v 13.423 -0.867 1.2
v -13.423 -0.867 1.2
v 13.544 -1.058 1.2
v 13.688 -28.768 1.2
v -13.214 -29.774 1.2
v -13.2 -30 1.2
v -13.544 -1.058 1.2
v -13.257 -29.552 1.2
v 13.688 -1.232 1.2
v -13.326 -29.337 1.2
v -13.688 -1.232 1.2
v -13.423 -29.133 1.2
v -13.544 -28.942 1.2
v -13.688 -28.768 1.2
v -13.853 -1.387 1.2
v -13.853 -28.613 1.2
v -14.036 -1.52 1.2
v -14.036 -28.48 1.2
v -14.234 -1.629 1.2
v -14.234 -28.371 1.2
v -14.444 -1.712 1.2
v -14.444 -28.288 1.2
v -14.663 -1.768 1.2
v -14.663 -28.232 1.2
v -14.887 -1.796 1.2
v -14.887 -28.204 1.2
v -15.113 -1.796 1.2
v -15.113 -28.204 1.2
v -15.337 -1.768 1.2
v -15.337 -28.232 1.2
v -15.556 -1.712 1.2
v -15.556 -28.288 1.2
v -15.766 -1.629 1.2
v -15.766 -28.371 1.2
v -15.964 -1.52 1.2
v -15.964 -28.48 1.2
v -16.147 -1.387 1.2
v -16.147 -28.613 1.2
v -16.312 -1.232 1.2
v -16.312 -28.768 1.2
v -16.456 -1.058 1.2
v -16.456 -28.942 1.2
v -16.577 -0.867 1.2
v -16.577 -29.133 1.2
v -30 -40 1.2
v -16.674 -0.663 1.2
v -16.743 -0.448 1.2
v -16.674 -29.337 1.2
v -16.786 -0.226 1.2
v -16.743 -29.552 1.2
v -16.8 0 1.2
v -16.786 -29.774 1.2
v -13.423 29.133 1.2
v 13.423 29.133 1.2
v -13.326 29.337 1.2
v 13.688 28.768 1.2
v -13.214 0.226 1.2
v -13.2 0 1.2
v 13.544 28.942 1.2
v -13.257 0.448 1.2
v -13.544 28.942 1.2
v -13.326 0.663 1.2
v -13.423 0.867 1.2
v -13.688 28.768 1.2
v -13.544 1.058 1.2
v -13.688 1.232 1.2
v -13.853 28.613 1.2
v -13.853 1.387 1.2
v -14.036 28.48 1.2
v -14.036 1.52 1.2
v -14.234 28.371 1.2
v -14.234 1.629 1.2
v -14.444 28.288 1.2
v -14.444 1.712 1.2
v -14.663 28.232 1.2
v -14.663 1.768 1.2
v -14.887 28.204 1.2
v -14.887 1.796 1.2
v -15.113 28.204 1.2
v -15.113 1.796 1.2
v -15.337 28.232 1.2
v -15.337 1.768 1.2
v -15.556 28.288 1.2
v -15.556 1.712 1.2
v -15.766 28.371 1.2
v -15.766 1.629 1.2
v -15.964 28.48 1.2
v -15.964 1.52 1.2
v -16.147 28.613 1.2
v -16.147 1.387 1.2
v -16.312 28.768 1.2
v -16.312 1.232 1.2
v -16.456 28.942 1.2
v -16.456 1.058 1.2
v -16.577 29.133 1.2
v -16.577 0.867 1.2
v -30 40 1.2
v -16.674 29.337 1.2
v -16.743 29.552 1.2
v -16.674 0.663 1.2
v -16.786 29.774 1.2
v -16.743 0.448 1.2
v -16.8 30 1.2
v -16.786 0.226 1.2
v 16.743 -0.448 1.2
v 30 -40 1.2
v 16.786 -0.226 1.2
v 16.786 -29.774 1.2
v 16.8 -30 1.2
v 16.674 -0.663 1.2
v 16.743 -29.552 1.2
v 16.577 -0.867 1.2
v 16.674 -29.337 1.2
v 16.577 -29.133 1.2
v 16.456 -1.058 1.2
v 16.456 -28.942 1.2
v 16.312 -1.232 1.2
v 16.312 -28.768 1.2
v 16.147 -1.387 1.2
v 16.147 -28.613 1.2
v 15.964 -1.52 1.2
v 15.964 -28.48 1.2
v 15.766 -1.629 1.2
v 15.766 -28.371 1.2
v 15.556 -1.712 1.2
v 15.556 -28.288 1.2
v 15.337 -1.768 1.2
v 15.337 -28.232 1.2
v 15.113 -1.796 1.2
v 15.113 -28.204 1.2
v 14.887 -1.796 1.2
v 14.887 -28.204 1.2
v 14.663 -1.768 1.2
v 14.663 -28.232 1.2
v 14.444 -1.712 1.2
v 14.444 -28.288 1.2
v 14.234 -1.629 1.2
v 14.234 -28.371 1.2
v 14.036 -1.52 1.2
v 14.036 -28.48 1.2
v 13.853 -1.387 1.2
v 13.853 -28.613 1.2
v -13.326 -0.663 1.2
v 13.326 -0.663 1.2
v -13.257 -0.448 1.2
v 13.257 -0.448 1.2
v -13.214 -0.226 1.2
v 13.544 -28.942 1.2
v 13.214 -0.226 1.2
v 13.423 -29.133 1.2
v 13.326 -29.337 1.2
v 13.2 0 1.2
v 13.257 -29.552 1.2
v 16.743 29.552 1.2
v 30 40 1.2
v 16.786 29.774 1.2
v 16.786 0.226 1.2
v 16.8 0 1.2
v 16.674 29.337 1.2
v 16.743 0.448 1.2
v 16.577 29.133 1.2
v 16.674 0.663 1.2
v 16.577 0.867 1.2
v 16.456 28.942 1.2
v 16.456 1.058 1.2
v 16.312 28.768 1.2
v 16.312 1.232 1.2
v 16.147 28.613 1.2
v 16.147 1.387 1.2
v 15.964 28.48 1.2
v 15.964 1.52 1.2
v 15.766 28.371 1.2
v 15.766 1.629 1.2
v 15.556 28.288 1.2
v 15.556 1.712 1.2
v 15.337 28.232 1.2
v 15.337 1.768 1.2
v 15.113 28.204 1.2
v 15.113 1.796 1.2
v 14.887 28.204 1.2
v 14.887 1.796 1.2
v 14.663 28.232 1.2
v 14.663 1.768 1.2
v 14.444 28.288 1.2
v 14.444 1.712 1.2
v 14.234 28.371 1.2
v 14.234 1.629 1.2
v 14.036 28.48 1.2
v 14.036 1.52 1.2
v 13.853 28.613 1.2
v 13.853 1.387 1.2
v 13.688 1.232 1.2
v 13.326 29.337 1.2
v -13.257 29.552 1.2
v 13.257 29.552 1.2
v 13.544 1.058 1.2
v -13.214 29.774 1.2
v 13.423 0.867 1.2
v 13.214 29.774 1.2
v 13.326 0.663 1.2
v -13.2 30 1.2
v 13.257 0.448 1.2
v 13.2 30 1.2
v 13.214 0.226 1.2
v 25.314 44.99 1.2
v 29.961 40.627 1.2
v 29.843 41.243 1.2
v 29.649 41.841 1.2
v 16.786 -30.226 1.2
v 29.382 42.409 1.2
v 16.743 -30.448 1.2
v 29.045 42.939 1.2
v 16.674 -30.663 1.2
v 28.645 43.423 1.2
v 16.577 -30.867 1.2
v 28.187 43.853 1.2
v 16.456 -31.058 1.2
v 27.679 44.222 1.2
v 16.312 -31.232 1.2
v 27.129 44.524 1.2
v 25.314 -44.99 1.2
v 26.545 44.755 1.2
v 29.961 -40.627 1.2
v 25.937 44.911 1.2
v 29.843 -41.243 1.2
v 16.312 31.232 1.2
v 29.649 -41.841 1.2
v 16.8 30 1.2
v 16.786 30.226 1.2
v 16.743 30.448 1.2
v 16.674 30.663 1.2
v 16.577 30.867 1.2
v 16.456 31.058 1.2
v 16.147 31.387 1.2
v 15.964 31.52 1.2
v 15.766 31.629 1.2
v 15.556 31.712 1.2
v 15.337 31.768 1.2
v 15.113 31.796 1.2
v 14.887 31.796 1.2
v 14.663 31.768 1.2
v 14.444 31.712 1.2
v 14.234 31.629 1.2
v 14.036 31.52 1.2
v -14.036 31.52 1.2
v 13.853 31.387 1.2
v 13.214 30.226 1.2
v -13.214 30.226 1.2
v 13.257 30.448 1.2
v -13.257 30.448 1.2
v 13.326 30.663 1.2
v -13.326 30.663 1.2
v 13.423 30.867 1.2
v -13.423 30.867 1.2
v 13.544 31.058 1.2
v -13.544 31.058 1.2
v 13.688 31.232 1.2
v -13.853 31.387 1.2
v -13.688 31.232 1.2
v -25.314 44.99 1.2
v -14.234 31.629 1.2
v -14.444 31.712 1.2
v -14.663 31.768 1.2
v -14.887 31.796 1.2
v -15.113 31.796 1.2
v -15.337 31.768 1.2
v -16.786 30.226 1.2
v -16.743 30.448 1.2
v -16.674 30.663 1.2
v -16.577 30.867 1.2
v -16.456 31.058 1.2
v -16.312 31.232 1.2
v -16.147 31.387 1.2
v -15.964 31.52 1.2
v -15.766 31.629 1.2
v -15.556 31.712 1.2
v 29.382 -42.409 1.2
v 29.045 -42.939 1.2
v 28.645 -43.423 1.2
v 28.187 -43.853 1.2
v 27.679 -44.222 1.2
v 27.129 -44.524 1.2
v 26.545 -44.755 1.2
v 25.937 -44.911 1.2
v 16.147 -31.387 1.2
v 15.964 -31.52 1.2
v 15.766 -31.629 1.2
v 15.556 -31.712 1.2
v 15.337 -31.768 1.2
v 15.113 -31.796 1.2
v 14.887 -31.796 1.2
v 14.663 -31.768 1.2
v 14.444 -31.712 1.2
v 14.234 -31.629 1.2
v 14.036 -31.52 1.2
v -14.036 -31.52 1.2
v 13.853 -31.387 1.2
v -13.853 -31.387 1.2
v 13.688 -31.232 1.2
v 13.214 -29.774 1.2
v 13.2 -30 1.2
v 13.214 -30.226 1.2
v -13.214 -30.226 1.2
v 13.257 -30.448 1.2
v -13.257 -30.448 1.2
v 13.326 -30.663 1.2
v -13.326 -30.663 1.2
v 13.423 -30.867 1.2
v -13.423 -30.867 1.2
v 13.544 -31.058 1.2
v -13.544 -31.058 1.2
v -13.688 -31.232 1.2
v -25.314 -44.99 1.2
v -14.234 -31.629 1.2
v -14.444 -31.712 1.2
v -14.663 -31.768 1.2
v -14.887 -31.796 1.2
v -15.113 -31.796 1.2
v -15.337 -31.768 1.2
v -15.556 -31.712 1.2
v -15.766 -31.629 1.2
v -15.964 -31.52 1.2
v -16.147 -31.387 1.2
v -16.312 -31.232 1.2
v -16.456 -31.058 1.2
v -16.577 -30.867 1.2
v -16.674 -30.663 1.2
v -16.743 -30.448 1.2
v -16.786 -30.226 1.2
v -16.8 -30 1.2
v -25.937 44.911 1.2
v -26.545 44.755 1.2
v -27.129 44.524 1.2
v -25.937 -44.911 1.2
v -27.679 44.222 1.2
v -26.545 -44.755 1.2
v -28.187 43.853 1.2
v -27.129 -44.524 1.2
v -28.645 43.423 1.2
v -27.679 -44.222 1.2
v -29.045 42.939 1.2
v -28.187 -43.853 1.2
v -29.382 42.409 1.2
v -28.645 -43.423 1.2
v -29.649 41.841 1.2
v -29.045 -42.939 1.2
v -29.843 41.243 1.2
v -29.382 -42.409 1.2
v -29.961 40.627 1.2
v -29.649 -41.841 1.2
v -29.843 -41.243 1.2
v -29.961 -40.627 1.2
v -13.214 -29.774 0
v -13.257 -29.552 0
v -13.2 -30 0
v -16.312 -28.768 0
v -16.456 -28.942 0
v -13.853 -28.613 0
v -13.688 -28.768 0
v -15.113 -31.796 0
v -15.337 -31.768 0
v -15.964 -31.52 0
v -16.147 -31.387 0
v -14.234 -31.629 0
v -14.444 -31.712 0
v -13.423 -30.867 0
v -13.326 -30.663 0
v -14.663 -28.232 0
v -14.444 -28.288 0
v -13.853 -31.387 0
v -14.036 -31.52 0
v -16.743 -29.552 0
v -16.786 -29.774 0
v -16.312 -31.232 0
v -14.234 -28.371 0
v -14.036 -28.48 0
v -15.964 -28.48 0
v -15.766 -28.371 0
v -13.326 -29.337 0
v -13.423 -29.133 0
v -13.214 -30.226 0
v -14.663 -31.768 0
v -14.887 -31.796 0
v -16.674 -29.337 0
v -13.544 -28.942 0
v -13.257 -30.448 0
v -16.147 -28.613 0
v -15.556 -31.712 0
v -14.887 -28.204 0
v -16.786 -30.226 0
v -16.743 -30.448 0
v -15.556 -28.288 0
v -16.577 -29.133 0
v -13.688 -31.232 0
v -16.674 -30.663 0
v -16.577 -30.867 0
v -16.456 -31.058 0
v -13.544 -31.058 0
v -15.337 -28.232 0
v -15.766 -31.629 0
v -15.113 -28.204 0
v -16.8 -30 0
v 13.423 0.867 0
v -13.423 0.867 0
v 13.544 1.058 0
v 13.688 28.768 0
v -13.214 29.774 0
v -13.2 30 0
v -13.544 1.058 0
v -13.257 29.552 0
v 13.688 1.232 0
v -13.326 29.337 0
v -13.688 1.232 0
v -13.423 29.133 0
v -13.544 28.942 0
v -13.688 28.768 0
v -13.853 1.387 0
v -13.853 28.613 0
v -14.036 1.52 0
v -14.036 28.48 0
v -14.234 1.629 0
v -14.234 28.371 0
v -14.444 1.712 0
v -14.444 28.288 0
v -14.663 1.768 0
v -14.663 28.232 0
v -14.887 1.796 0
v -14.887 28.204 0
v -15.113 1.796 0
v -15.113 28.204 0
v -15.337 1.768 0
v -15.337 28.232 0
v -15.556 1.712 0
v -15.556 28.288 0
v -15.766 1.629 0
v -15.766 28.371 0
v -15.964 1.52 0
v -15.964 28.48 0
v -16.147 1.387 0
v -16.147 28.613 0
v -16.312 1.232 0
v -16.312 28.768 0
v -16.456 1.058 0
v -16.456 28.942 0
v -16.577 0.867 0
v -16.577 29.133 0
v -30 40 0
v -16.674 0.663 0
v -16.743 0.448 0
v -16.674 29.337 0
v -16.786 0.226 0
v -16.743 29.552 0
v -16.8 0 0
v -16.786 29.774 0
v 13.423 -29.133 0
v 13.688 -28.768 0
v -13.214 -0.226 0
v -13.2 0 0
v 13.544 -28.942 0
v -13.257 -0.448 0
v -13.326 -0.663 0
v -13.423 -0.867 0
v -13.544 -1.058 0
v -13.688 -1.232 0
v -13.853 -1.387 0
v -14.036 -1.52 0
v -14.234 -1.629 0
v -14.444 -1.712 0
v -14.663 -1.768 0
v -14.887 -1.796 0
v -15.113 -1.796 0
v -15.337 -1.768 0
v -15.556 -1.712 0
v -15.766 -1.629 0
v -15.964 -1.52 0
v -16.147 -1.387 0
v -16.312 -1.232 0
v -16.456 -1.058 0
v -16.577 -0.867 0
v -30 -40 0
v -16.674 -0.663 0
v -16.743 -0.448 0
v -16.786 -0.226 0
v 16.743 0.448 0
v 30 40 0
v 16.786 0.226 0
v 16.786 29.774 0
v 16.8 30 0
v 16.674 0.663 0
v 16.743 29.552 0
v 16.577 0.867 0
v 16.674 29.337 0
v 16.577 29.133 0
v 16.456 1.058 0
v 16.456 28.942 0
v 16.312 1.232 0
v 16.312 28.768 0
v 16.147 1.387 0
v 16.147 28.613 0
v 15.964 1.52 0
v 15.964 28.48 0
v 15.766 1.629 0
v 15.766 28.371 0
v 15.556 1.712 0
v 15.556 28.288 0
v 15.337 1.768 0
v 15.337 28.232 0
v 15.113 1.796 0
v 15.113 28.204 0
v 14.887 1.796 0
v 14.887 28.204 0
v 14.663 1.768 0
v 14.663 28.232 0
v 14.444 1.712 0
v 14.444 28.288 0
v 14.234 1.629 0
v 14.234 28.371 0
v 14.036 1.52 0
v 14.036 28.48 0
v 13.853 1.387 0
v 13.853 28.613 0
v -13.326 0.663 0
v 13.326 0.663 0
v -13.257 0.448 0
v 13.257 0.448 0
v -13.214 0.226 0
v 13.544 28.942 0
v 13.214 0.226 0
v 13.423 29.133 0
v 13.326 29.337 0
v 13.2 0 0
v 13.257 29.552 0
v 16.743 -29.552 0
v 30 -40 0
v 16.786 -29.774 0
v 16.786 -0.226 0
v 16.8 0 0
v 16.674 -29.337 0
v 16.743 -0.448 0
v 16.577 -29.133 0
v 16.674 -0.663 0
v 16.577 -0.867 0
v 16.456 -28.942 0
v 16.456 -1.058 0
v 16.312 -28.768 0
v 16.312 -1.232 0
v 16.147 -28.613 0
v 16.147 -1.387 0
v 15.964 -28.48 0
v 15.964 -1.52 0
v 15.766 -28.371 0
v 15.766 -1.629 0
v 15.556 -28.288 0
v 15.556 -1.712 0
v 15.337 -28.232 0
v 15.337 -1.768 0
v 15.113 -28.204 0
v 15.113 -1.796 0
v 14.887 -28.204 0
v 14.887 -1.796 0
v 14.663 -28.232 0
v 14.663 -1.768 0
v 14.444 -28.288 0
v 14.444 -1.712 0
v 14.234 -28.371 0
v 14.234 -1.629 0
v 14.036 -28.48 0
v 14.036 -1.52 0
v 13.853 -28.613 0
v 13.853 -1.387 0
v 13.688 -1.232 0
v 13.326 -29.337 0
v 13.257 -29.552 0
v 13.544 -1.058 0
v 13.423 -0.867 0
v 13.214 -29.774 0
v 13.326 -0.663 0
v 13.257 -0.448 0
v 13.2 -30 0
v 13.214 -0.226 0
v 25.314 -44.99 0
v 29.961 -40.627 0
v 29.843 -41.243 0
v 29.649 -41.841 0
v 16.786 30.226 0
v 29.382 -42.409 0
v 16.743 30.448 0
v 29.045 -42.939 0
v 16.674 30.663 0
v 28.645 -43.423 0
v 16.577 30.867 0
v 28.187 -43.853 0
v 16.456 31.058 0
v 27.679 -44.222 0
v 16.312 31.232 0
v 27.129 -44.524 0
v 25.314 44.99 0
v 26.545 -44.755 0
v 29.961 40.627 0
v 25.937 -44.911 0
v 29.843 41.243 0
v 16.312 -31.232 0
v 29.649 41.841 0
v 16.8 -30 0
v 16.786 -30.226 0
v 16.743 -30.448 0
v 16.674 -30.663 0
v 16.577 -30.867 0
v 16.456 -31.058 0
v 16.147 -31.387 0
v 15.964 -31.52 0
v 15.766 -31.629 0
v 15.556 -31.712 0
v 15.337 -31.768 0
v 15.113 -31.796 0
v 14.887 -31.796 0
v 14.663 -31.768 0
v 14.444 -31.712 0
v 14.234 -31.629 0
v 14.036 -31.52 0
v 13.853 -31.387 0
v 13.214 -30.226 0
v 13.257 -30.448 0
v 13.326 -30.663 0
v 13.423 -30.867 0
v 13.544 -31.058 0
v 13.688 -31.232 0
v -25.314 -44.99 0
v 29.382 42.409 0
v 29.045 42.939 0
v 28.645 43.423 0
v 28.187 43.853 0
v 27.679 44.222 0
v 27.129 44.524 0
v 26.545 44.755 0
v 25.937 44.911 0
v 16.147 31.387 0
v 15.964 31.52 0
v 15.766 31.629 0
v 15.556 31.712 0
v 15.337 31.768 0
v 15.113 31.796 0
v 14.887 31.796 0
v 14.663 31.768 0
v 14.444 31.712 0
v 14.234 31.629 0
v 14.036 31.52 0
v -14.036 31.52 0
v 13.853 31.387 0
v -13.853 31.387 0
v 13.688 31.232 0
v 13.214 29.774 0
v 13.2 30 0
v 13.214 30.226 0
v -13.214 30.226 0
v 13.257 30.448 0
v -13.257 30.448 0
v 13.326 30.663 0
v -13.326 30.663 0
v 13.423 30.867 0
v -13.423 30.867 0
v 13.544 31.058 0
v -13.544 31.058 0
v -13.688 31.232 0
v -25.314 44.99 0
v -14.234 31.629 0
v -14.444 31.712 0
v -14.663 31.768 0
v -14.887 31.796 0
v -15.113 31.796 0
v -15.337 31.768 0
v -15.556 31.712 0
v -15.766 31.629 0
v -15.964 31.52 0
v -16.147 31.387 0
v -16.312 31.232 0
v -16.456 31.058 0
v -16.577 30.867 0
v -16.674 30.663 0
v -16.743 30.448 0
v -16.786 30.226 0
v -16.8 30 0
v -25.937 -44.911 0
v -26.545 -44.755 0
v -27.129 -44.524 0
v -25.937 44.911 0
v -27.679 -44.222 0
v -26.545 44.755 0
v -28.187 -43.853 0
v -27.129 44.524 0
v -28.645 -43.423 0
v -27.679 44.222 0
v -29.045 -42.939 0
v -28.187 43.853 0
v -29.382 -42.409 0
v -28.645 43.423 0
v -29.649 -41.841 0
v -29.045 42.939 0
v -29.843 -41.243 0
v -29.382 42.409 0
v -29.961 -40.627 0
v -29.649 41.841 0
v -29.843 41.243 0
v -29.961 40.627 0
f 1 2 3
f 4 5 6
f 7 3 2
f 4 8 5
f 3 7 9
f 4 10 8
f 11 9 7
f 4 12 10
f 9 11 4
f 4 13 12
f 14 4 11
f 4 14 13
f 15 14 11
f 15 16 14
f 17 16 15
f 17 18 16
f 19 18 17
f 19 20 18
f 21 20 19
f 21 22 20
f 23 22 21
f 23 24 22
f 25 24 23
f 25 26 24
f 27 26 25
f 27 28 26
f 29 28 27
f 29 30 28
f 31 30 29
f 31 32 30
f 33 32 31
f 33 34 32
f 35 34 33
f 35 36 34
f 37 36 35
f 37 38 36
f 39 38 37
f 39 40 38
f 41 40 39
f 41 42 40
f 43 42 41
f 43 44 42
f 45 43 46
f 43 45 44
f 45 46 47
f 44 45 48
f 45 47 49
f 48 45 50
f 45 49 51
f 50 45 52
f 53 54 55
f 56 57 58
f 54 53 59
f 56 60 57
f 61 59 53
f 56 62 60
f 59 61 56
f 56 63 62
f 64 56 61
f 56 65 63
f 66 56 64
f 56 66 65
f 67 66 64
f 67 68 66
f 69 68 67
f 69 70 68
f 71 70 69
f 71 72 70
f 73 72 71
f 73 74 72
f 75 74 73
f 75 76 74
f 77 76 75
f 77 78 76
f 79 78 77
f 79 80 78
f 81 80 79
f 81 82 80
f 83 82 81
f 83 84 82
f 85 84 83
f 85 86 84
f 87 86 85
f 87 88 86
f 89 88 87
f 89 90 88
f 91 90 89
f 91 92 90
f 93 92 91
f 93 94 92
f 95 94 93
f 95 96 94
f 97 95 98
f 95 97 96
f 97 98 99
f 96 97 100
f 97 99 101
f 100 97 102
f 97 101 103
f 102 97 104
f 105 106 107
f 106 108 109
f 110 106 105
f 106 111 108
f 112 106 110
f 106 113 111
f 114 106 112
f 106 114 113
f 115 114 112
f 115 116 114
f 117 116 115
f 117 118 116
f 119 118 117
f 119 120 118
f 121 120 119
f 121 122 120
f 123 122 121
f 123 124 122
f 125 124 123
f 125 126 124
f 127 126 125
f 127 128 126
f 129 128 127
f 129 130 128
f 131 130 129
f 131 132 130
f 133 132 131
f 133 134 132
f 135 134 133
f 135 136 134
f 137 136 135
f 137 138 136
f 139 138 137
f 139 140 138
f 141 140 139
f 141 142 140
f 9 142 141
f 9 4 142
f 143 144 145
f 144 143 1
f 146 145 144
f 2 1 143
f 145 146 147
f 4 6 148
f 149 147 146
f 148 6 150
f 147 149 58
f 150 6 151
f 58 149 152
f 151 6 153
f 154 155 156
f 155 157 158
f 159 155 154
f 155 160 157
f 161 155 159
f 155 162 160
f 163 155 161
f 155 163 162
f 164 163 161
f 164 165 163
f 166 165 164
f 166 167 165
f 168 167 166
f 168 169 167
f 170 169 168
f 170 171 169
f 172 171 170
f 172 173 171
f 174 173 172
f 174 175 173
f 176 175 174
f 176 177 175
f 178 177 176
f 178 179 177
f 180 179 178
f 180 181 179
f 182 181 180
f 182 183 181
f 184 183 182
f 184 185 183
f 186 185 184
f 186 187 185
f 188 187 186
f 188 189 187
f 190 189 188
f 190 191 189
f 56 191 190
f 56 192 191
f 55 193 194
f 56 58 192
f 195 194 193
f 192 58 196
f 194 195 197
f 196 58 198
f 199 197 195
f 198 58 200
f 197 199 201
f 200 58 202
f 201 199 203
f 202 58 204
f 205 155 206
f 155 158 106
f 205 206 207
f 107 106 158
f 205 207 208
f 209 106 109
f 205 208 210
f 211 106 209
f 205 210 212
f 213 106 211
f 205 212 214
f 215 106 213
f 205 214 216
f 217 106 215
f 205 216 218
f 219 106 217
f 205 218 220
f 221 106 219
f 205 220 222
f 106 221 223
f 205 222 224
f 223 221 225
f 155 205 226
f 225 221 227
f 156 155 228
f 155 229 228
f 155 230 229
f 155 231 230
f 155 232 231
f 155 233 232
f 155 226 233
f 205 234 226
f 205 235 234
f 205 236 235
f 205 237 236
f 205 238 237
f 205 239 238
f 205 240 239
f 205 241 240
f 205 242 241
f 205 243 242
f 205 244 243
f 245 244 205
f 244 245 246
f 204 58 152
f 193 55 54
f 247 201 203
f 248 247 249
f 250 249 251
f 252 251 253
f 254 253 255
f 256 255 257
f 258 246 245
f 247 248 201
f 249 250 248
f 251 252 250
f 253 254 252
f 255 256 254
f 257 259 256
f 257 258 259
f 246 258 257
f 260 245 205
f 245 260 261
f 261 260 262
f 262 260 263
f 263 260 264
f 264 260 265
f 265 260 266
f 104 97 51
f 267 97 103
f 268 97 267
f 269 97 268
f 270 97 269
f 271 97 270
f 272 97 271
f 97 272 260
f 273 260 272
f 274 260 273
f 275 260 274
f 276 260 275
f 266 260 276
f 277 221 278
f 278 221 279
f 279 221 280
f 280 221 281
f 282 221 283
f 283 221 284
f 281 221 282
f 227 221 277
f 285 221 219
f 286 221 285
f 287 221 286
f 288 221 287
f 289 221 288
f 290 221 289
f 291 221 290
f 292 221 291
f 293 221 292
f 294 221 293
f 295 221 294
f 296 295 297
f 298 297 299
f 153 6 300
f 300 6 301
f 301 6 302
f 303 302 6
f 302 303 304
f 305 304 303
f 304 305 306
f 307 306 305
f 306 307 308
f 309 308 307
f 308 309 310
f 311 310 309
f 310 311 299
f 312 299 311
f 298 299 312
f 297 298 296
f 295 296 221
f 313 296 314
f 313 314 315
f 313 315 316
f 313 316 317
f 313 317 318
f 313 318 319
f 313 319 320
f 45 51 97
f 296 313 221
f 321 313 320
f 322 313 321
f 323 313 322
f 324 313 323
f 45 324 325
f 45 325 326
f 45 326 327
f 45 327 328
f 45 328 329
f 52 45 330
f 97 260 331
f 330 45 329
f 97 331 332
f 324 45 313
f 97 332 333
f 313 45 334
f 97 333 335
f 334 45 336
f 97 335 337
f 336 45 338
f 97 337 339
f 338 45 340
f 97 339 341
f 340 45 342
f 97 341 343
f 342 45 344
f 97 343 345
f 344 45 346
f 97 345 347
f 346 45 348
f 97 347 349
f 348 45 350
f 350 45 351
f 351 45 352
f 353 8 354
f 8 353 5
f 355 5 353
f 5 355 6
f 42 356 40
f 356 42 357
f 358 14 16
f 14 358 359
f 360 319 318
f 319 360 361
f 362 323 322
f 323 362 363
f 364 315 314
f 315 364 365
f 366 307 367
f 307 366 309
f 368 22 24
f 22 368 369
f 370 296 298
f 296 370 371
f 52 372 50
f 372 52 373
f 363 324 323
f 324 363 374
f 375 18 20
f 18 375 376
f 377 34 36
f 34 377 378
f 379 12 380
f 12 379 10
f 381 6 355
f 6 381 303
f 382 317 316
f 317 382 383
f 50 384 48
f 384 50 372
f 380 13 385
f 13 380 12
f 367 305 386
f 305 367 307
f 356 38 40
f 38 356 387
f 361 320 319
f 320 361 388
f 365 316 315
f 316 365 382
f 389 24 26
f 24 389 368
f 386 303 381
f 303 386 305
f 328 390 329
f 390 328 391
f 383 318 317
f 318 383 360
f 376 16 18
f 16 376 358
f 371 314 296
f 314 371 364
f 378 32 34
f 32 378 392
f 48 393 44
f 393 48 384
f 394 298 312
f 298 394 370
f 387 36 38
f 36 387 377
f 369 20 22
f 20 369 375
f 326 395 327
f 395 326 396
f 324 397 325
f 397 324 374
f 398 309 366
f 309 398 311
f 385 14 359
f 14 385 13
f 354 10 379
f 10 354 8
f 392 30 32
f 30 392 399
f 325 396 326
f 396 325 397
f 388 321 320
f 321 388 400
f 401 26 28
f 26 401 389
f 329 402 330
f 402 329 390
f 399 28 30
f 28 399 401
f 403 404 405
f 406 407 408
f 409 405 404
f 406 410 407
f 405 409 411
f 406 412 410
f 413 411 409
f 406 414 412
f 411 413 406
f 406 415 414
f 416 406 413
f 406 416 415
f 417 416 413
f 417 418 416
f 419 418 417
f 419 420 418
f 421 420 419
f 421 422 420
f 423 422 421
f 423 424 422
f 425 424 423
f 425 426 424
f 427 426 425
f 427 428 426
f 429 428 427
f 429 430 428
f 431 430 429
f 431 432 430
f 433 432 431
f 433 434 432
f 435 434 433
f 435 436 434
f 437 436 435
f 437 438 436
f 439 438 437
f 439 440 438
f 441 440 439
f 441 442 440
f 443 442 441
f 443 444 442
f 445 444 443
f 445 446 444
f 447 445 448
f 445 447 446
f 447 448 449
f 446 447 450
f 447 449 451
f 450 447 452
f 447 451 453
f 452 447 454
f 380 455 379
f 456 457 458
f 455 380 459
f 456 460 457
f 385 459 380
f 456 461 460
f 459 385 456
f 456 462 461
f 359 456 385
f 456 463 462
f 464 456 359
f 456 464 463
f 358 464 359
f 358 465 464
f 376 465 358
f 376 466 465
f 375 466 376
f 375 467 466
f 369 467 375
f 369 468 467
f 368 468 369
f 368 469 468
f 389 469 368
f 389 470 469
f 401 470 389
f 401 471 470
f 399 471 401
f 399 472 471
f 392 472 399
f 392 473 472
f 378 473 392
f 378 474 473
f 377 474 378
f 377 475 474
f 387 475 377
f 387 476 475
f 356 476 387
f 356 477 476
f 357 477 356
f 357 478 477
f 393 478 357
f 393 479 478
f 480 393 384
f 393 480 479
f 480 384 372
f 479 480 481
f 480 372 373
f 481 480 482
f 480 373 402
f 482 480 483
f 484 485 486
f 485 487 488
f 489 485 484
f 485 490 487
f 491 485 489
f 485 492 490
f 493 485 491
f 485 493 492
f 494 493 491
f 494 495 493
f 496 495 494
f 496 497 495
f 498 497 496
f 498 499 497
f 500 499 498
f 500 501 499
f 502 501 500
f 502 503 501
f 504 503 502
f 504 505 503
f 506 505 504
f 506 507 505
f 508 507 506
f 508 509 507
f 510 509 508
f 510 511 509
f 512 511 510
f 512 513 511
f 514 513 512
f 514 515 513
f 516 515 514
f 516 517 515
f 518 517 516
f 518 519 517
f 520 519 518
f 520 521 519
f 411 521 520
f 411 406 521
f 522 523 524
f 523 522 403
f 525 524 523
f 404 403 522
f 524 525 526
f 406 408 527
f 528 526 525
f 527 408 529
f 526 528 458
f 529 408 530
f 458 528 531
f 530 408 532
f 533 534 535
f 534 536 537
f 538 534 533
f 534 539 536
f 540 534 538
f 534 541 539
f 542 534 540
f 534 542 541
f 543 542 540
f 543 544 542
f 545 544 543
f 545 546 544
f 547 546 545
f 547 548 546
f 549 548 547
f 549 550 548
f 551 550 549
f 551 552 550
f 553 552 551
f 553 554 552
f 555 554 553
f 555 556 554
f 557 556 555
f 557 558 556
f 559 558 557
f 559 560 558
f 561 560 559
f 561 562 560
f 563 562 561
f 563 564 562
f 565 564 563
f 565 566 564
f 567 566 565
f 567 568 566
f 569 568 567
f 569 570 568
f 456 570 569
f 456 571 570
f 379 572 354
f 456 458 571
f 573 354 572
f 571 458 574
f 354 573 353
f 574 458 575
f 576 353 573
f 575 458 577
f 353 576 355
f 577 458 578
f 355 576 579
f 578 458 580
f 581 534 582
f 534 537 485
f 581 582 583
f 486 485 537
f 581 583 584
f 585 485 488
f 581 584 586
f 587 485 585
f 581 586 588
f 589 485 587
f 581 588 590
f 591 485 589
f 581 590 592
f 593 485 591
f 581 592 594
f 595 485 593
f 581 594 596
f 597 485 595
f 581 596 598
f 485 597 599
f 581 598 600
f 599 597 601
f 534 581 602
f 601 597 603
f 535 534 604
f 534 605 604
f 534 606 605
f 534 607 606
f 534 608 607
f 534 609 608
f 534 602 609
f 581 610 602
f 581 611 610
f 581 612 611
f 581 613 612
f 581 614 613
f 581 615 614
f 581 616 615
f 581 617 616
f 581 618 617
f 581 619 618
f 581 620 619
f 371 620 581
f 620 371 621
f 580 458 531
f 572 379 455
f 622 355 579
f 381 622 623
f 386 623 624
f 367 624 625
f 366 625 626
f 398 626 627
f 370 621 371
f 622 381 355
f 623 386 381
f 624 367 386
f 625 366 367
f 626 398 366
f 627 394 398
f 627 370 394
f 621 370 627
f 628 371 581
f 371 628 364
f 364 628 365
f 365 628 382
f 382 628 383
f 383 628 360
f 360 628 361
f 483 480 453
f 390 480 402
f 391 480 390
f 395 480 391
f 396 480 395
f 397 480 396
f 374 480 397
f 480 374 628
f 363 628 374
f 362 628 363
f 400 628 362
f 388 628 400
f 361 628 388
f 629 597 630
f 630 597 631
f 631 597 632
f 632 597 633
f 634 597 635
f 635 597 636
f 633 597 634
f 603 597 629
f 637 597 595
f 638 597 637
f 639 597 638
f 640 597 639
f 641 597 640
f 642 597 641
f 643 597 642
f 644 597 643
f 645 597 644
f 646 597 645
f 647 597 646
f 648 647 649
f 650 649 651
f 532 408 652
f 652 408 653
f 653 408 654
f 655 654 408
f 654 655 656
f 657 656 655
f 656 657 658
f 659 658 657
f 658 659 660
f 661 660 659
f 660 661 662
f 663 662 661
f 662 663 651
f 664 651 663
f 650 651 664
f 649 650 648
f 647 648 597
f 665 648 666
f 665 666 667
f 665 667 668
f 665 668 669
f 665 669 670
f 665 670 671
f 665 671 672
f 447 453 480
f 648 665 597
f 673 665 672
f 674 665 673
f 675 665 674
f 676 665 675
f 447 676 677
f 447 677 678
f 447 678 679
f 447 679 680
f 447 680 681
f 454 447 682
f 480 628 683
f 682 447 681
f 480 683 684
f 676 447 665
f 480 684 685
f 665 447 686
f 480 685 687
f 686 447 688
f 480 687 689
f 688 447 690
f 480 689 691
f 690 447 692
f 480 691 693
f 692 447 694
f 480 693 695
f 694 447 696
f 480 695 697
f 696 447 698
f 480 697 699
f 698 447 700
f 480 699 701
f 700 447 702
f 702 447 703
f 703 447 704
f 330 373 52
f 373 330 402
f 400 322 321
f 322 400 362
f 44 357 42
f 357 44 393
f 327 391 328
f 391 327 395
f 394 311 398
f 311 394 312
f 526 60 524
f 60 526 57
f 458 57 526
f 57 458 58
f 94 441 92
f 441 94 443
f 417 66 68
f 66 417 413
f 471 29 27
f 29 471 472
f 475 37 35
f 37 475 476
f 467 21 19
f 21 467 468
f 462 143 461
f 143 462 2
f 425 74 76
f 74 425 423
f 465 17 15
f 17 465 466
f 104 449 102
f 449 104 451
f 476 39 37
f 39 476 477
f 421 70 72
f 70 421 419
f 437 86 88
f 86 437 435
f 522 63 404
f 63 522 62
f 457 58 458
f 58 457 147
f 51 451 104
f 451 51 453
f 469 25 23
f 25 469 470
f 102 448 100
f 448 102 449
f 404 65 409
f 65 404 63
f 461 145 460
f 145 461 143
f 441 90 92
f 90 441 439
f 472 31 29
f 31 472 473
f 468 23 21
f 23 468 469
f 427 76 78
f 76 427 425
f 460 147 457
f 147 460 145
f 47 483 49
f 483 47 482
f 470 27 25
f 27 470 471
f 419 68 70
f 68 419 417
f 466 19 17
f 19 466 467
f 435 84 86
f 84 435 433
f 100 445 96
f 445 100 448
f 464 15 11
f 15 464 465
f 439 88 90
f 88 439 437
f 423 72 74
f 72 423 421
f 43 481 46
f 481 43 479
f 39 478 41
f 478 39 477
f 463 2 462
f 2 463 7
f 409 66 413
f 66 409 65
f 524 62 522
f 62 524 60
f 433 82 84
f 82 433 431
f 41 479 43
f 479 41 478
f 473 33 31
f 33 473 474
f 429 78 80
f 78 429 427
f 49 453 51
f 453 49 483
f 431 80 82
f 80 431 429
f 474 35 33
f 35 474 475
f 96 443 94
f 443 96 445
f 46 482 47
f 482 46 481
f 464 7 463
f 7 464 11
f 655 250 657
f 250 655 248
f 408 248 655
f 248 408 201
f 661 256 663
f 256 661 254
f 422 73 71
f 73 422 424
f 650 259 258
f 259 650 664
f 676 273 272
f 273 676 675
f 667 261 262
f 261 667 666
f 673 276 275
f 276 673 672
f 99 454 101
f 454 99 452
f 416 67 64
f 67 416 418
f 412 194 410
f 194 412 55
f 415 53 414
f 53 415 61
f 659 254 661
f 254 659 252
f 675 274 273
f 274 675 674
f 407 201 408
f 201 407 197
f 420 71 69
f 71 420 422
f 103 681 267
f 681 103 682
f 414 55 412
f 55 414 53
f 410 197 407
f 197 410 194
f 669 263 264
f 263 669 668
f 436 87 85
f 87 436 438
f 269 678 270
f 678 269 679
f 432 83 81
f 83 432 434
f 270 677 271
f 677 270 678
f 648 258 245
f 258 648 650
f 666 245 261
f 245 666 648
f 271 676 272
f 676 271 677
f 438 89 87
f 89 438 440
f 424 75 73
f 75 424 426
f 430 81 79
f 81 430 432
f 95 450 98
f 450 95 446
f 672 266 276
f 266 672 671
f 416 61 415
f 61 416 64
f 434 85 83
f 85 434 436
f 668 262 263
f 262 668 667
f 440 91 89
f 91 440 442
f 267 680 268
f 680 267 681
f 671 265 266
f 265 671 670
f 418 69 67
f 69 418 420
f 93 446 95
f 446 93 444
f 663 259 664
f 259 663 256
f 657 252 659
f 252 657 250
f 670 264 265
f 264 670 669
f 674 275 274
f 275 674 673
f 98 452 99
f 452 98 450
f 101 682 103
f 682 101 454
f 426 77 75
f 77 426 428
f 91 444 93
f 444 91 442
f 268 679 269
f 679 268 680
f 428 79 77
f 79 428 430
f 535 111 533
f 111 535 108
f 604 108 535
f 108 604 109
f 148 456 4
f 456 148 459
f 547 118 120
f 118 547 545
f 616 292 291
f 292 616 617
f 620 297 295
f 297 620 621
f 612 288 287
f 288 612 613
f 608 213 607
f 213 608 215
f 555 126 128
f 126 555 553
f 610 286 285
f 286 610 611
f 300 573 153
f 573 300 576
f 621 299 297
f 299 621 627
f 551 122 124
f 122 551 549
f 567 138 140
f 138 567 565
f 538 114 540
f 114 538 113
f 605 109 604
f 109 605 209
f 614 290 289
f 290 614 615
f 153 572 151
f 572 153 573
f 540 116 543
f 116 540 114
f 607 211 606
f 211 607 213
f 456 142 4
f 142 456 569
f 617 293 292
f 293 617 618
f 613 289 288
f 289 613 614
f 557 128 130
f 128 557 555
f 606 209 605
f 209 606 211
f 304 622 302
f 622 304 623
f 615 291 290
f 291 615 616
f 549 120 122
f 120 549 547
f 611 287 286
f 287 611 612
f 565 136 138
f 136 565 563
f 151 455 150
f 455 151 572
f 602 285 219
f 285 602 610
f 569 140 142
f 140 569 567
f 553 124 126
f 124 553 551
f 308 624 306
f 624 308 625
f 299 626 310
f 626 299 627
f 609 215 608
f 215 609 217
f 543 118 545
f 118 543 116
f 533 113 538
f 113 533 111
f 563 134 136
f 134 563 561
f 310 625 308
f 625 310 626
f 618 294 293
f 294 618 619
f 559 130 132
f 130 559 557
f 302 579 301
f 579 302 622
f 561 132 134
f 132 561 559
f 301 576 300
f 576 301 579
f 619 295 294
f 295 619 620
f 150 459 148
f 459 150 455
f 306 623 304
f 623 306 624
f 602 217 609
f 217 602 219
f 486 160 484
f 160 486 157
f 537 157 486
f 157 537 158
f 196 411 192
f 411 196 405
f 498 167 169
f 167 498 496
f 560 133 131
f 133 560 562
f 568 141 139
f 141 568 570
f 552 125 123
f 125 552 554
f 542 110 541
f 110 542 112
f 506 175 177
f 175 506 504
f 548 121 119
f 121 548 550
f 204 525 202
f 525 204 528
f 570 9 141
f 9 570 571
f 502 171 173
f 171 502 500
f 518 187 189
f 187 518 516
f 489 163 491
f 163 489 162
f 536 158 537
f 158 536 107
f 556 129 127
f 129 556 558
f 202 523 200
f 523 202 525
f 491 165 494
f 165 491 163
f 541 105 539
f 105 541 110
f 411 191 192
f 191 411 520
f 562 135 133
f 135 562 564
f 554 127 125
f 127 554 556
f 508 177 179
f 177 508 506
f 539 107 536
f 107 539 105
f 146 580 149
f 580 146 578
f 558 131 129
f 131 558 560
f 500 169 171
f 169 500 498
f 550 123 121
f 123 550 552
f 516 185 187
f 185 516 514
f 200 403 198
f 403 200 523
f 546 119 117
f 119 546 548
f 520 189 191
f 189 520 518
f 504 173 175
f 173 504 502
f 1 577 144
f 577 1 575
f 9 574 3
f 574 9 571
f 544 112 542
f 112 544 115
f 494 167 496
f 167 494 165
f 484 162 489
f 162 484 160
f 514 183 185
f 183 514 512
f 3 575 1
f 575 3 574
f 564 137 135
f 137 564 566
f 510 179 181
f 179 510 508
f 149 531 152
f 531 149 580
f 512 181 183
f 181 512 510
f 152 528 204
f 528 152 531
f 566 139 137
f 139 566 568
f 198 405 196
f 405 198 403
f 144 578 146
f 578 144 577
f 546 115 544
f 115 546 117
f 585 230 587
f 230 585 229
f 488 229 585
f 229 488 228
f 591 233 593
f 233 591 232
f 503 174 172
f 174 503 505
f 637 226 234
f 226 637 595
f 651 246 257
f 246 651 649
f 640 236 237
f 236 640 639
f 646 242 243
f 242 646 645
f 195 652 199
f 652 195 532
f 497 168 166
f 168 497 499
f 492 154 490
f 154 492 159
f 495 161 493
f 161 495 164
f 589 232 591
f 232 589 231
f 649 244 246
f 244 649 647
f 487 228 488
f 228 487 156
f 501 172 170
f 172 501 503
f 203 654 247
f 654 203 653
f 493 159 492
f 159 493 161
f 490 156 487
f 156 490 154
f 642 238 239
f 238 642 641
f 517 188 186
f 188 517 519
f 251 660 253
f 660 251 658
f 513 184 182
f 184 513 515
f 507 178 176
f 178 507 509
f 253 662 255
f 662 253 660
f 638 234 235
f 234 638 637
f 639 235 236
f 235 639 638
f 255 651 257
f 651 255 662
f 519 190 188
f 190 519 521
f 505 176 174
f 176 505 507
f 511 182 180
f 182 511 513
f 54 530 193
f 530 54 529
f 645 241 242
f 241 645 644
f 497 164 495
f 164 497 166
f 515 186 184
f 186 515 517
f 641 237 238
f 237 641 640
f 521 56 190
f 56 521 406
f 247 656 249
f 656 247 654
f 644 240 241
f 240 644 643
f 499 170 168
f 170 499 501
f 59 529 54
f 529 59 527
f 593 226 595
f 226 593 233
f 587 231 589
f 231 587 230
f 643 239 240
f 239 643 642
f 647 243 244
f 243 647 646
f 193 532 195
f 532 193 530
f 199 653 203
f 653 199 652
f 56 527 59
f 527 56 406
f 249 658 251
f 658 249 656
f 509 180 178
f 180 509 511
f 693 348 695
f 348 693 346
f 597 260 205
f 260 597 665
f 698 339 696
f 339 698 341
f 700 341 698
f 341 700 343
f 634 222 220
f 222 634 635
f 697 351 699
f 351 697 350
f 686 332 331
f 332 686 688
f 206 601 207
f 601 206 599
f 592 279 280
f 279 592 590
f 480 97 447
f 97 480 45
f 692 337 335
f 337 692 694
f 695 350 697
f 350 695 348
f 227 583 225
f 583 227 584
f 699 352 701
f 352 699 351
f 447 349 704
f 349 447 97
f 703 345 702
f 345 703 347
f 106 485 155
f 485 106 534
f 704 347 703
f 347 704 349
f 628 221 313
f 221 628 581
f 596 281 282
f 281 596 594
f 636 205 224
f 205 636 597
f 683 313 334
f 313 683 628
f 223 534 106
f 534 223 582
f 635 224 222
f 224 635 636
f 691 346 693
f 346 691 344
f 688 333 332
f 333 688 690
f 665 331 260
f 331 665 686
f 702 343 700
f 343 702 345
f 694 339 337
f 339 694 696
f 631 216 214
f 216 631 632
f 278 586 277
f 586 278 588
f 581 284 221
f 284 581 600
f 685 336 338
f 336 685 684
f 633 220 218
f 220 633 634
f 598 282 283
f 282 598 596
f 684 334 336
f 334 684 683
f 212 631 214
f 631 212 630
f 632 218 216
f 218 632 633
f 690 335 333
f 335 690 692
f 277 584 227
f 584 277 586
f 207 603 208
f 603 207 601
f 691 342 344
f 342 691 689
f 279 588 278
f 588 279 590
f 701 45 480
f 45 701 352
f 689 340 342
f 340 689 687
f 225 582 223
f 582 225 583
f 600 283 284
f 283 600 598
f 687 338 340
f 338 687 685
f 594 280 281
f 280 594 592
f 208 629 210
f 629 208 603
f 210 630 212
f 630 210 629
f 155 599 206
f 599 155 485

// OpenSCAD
$fn = 50;


difference() {
	union() {
		hull() {
			translate(v = [-25.0000000000, 40.0000000000, 0]) {
				cylinder(h = 9, r = 5);
			}
			translate(v = [25.0000000000, 40.0000000000, 0]) {
				cylinder(h = 9, r = 5);
			}
			translate(v = [-25.0000000000, -40.0000000000, 0]) {
				cylinder(h = 9, r = 5);
			}
			translate(v = [25.0000000000, -40.0000000000, 0]) {
				cylinder(h = 9, r = 5);
			}
		}
	}
	union() {
		translate(v = [0, 0, 1.2000000000]) {
			hull() {
				translate(v = [-25.0000000000, 40.0000000000, 0]) {
					cylinder(h = 7.8000000000, r = 3.8000000000);
				}
				translate(v = [25.0000000000, 40.0000000000, 0]) {
					cylinder(h = 7.8000000000, r = 3.8000000000);
				}
				translate(v = [-25.0000000000, -40.0000000000, 0]) {
					cylinder(h = 7.8000000000, r = 3.8000000000);
				}
				translate(v = [25.0000000000, -40.0000000000, 0]) {
					cylinder(h = 7.8000000000, r = 3.8000000000);
				}
			}
		}
		#translate(v = [-15.0000000000, -30.0000000000, 0]) {
			cylinder(h = 1.2000000000, r = 1.8000000000);
		}
		#translate(v = [-15.0000000000, 0.0000000000, 0]) {
			cylinder(h = 1.2000000000, r = 1.8000000000);
		}
		#translate(v = [-15.0000000000, 30.0000000000, 0]) {
			cylinder(h = 1.2000000000, r = 1.8000000000);
		}
		#translate(v = [15.0000000000, -30.0000000000, 0]) {
			cylinder(h = 1.2000000000, r = 1.8000000000);
		}
		#translate(v = [15.0000000000, 0.0000000000, 0]) {
			cylinder(h = 1.2000000000, r = 1.8000000000);
		}
		#translate(v = [15.0000000000, 30.0000000000, 0]) {
			cylinder(h = 1.2000000000, r = 1.8000000000);
		}
		translate(v = [-250.0000000000, -250.0000000000, 1.2000000000]) {
			cube(size = [500, 500, 500]);
		}
		translate(v = [-250.0000000000, -250.0000000000, 1.2000000000]) {
			cube(size = [500, 500, 500]);
		}
		translate(v = [-250.0000000000, -250.0000000000, 1.2000000000]) {
			cube(size = [500, 500, 500]);
		}
	}
}
